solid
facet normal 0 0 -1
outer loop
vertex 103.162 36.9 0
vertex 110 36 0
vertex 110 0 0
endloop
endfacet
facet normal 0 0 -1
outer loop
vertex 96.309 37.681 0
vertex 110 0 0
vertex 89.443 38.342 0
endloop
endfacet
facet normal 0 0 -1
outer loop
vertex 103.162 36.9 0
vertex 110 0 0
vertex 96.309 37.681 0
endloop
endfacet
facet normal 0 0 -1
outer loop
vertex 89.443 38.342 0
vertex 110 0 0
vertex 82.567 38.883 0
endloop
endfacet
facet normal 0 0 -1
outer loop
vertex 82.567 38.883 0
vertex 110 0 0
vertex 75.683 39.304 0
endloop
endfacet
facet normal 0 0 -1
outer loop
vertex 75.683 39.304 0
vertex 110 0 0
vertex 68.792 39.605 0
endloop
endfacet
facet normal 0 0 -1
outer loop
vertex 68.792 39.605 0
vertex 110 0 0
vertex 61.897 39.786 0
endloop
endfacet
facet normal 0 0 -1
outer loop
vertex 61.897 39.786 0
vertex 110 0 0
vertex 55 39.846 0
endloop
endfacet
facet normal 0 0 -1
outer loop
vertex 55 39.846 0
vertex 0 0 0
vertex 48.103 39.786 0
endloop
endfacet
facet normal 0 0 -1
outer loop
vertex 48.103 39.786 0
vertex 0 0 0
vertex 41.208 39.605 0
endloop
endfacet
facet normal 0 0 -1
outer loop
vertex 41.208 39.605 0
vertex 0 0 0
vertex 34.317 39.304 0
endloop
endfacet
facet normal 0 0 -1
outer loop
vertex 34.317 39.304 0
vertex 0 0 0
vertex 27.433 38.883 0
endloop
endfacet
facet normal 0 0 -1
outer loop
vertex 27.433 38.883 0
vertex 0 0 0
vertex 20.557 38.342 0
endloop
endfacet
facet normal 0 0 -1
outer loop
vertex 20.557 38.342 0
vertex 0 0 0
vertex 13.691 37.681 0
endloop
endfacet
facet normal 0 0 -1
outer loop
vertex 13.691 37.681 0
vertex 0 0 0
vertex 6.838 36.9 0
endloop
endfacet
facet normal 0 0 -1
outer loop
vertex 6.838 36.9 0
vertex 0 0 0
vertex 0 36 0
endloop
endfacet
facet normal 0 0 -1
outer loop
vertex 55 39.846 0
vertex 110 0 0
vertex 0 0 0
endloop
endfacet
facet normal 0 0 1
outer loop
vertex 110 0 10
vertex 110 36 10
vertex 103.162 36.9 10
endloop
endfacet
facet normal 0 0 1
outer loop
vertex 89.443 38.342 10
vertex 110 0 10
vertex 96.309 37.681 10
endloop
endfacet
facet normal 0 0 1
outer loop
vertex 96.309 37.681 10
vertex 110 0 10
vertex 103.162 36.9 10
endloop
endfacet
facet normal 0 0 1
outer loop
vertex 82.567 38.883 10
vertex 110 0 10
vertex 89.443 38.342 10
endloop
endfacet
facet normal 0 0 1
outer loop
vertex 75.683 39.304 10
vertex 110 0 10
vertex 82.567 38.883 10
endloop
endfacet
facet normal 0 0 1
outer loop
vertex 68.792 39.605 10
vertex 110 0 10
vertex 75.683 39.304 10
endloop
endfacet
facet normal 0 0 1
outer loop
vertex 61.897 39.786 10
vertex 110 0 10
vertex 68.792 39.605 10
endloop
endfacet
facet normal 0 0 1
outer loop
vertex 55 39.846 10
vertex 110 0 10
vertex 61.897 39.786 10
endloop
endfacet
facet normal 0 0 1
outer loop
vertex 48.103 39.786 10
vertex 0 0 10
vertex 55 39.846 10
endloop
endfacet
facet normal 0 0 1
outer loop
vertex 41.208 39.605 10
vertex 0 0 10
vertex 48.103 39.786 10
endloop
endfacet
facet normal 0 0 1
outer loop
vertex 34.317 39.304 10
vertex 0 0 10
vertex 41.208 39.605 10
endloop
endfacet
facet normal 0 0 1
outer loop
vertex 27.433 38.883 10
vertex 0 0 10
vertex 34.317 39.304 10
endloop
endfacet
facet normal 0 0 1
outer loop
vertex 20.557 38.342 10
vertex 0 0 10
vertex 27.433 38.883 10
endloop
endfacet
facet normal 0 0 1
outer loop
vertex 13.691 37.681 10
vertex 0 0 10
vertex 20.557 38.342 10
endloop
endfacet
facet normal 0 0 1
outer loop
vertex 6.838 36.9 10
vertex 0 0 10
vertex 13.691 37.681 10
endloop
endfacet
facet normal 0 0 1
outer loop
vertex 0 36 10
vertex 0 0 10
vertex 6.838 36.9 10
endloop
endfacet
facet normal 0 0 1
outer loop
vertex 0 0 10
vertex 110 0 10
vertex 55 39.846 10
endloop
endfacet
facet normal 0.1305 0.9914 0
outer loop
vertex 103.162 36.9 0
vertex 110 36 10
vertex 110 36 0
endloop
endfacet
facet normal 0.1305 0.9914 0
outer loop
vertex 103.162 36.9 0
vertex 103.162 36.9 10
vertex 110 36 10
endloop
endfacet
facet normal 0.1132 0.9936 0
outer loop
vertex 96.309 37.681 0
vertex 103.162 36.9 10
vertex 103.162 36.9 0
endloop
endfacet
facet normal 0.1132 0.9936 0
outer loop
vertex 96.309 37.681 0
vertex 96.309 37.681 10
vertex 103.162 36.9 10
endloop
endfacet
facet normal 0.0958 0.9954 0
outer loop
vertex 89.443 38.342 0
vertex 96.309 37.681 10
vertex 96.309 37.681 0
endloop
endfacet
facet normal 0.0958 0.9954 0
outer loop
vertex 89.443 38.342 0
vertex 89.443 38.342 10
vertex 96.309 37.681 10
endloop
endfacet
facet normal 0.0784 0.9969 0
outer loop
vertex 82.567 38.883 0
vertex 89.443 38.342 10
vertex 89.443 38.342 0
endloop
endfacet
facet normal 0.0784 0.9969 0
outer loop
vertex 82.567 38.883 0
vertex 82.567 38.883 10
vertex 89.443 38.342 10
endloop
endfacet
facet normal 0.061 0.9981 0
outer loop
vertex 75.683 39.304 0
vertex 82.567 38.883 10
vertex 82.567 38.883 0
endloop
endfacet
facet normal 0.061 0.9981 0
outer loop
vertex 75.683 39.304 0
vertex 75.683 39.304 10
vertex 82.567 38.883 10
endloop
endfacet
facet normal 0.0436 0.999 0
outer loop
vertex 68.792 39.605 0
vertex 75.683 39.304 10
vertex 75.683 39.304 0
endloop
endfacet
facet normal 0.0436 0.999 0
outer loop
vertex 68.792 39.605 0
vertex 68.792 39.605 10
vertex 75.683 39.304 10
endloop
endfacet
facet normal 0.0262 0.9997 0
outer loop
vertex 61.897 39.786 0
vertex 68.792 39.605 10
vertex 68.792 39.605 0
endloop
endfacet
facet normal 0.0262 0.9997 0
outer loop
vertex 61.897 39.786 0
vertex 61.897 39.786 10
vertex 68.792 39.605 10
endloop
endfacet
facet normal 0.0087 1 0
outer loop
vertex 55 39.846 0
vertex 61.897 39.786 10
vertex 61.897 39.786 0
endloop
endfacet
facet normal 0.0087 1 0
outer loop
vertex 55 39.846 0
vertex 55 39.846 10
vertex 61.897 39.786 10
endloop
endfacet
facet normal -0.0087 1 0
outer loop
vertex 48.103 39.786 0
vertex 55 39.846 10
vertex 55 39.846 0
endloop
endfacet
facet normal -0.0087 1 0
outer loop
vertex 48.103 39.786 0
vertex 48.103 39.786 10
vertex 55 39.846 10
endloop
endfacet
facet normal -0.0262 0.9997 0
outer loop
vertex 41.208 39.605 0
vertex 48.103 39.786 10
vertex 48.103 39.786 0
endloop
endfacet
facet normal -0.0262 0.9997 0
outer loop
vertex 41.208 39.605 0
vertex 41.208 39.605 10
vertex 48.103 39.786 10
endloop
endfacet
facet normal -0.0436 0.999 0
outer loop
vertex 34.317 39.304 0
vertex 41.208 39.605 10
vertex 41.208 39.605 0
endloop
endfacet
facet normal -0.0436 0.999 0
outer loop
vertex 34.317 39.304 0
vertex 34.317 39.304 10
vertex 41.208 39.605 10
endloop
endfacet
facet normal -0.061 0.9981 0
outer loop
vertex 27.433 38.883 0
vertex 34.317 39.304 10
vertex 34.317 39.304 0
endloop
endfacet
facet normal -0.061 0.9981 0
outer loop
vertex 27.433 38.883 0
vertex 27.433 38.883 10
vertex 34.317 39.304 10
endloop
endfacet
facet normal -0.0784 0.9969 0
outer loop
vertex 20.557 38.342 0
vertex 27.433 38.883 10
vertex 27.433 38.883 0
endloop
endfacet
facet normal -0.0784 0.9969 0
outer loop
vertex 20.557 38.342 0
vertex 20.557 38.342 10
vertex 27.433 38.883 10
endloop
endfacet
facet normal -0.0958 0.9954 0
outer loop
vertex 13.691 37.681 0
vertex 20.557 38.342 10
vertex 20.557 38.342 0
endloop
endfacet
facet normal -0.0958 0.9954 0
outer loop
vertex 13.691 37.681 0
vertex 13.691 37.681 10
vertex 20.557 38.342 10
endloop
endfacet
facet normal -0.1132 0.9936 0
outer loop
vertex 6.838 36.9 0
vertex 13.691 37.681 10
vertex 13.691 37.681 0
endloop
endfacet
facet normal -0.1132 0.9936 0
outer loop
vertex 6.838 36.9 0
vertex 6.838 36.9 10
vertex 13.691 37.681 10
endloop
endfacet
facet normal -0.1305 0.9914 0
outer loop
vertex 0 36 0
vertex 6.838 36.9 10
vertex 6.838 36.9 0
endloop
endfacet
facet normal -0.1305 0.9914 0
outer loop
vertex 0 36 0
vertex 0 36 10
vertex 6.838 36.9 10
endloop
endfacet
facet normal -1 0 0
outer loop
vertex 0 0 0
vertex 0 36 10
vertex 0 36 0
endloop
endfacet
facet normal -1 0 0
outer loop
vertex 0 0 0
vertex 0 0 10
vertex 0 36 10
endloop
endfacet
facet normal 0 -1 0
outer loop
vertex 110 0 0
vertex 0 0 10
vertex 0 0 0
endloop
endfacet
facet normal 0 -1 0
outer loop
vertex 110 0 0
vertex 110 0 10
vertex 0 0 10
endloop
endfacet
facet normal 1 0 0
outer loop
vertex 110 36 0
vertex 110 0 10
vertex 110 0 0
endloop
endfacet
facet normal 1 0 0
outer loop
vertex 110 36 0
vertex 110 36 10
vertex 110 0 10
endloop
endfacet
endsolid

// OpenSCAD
$fn = 32;

// ----------------------------------------------------------------------
// Arc profile plate: crown, 19 points
// ----------------------------------------------------------------------

// --- parameters (mm) ---
bar_l = 110;              // bar length, X
bar_w = 36;               // bar height at the ends, Y
arc_r = 395.19;           // radius of the crown arc
arc_angle = 16;           // crown arc angle, degrees
crown_rise = 3.85;        // rise of the crown over the ends
arc_step = 1;             // sampling step of the crown arc, degrees
plate_t = 10;             // plate thickness, Z

bbox_y = bar_w + crown_rise;  // full height with the crown

profile = [[110, 36], [103.162, 36.9], [96.309, 37.681], [89.443, 38.342], [82.567, 38.883], [75.683, 39.304], [68.792, 39.605], [61.897, 39.786], [55, 39.846], [48.103, 39.786], [41.208, 39.605], [34.317, 39.304], [27.433, 38.883], [20.557, 38.342], [13.691, 37.681], [6.838, 36.9], [0, 36], [0, 0], [110, 0]];  // primary outline, 19 points, counter clockwise

// --- the one profile operation ---
linear_extrude(height = plate_t) polygon(points = profile);
